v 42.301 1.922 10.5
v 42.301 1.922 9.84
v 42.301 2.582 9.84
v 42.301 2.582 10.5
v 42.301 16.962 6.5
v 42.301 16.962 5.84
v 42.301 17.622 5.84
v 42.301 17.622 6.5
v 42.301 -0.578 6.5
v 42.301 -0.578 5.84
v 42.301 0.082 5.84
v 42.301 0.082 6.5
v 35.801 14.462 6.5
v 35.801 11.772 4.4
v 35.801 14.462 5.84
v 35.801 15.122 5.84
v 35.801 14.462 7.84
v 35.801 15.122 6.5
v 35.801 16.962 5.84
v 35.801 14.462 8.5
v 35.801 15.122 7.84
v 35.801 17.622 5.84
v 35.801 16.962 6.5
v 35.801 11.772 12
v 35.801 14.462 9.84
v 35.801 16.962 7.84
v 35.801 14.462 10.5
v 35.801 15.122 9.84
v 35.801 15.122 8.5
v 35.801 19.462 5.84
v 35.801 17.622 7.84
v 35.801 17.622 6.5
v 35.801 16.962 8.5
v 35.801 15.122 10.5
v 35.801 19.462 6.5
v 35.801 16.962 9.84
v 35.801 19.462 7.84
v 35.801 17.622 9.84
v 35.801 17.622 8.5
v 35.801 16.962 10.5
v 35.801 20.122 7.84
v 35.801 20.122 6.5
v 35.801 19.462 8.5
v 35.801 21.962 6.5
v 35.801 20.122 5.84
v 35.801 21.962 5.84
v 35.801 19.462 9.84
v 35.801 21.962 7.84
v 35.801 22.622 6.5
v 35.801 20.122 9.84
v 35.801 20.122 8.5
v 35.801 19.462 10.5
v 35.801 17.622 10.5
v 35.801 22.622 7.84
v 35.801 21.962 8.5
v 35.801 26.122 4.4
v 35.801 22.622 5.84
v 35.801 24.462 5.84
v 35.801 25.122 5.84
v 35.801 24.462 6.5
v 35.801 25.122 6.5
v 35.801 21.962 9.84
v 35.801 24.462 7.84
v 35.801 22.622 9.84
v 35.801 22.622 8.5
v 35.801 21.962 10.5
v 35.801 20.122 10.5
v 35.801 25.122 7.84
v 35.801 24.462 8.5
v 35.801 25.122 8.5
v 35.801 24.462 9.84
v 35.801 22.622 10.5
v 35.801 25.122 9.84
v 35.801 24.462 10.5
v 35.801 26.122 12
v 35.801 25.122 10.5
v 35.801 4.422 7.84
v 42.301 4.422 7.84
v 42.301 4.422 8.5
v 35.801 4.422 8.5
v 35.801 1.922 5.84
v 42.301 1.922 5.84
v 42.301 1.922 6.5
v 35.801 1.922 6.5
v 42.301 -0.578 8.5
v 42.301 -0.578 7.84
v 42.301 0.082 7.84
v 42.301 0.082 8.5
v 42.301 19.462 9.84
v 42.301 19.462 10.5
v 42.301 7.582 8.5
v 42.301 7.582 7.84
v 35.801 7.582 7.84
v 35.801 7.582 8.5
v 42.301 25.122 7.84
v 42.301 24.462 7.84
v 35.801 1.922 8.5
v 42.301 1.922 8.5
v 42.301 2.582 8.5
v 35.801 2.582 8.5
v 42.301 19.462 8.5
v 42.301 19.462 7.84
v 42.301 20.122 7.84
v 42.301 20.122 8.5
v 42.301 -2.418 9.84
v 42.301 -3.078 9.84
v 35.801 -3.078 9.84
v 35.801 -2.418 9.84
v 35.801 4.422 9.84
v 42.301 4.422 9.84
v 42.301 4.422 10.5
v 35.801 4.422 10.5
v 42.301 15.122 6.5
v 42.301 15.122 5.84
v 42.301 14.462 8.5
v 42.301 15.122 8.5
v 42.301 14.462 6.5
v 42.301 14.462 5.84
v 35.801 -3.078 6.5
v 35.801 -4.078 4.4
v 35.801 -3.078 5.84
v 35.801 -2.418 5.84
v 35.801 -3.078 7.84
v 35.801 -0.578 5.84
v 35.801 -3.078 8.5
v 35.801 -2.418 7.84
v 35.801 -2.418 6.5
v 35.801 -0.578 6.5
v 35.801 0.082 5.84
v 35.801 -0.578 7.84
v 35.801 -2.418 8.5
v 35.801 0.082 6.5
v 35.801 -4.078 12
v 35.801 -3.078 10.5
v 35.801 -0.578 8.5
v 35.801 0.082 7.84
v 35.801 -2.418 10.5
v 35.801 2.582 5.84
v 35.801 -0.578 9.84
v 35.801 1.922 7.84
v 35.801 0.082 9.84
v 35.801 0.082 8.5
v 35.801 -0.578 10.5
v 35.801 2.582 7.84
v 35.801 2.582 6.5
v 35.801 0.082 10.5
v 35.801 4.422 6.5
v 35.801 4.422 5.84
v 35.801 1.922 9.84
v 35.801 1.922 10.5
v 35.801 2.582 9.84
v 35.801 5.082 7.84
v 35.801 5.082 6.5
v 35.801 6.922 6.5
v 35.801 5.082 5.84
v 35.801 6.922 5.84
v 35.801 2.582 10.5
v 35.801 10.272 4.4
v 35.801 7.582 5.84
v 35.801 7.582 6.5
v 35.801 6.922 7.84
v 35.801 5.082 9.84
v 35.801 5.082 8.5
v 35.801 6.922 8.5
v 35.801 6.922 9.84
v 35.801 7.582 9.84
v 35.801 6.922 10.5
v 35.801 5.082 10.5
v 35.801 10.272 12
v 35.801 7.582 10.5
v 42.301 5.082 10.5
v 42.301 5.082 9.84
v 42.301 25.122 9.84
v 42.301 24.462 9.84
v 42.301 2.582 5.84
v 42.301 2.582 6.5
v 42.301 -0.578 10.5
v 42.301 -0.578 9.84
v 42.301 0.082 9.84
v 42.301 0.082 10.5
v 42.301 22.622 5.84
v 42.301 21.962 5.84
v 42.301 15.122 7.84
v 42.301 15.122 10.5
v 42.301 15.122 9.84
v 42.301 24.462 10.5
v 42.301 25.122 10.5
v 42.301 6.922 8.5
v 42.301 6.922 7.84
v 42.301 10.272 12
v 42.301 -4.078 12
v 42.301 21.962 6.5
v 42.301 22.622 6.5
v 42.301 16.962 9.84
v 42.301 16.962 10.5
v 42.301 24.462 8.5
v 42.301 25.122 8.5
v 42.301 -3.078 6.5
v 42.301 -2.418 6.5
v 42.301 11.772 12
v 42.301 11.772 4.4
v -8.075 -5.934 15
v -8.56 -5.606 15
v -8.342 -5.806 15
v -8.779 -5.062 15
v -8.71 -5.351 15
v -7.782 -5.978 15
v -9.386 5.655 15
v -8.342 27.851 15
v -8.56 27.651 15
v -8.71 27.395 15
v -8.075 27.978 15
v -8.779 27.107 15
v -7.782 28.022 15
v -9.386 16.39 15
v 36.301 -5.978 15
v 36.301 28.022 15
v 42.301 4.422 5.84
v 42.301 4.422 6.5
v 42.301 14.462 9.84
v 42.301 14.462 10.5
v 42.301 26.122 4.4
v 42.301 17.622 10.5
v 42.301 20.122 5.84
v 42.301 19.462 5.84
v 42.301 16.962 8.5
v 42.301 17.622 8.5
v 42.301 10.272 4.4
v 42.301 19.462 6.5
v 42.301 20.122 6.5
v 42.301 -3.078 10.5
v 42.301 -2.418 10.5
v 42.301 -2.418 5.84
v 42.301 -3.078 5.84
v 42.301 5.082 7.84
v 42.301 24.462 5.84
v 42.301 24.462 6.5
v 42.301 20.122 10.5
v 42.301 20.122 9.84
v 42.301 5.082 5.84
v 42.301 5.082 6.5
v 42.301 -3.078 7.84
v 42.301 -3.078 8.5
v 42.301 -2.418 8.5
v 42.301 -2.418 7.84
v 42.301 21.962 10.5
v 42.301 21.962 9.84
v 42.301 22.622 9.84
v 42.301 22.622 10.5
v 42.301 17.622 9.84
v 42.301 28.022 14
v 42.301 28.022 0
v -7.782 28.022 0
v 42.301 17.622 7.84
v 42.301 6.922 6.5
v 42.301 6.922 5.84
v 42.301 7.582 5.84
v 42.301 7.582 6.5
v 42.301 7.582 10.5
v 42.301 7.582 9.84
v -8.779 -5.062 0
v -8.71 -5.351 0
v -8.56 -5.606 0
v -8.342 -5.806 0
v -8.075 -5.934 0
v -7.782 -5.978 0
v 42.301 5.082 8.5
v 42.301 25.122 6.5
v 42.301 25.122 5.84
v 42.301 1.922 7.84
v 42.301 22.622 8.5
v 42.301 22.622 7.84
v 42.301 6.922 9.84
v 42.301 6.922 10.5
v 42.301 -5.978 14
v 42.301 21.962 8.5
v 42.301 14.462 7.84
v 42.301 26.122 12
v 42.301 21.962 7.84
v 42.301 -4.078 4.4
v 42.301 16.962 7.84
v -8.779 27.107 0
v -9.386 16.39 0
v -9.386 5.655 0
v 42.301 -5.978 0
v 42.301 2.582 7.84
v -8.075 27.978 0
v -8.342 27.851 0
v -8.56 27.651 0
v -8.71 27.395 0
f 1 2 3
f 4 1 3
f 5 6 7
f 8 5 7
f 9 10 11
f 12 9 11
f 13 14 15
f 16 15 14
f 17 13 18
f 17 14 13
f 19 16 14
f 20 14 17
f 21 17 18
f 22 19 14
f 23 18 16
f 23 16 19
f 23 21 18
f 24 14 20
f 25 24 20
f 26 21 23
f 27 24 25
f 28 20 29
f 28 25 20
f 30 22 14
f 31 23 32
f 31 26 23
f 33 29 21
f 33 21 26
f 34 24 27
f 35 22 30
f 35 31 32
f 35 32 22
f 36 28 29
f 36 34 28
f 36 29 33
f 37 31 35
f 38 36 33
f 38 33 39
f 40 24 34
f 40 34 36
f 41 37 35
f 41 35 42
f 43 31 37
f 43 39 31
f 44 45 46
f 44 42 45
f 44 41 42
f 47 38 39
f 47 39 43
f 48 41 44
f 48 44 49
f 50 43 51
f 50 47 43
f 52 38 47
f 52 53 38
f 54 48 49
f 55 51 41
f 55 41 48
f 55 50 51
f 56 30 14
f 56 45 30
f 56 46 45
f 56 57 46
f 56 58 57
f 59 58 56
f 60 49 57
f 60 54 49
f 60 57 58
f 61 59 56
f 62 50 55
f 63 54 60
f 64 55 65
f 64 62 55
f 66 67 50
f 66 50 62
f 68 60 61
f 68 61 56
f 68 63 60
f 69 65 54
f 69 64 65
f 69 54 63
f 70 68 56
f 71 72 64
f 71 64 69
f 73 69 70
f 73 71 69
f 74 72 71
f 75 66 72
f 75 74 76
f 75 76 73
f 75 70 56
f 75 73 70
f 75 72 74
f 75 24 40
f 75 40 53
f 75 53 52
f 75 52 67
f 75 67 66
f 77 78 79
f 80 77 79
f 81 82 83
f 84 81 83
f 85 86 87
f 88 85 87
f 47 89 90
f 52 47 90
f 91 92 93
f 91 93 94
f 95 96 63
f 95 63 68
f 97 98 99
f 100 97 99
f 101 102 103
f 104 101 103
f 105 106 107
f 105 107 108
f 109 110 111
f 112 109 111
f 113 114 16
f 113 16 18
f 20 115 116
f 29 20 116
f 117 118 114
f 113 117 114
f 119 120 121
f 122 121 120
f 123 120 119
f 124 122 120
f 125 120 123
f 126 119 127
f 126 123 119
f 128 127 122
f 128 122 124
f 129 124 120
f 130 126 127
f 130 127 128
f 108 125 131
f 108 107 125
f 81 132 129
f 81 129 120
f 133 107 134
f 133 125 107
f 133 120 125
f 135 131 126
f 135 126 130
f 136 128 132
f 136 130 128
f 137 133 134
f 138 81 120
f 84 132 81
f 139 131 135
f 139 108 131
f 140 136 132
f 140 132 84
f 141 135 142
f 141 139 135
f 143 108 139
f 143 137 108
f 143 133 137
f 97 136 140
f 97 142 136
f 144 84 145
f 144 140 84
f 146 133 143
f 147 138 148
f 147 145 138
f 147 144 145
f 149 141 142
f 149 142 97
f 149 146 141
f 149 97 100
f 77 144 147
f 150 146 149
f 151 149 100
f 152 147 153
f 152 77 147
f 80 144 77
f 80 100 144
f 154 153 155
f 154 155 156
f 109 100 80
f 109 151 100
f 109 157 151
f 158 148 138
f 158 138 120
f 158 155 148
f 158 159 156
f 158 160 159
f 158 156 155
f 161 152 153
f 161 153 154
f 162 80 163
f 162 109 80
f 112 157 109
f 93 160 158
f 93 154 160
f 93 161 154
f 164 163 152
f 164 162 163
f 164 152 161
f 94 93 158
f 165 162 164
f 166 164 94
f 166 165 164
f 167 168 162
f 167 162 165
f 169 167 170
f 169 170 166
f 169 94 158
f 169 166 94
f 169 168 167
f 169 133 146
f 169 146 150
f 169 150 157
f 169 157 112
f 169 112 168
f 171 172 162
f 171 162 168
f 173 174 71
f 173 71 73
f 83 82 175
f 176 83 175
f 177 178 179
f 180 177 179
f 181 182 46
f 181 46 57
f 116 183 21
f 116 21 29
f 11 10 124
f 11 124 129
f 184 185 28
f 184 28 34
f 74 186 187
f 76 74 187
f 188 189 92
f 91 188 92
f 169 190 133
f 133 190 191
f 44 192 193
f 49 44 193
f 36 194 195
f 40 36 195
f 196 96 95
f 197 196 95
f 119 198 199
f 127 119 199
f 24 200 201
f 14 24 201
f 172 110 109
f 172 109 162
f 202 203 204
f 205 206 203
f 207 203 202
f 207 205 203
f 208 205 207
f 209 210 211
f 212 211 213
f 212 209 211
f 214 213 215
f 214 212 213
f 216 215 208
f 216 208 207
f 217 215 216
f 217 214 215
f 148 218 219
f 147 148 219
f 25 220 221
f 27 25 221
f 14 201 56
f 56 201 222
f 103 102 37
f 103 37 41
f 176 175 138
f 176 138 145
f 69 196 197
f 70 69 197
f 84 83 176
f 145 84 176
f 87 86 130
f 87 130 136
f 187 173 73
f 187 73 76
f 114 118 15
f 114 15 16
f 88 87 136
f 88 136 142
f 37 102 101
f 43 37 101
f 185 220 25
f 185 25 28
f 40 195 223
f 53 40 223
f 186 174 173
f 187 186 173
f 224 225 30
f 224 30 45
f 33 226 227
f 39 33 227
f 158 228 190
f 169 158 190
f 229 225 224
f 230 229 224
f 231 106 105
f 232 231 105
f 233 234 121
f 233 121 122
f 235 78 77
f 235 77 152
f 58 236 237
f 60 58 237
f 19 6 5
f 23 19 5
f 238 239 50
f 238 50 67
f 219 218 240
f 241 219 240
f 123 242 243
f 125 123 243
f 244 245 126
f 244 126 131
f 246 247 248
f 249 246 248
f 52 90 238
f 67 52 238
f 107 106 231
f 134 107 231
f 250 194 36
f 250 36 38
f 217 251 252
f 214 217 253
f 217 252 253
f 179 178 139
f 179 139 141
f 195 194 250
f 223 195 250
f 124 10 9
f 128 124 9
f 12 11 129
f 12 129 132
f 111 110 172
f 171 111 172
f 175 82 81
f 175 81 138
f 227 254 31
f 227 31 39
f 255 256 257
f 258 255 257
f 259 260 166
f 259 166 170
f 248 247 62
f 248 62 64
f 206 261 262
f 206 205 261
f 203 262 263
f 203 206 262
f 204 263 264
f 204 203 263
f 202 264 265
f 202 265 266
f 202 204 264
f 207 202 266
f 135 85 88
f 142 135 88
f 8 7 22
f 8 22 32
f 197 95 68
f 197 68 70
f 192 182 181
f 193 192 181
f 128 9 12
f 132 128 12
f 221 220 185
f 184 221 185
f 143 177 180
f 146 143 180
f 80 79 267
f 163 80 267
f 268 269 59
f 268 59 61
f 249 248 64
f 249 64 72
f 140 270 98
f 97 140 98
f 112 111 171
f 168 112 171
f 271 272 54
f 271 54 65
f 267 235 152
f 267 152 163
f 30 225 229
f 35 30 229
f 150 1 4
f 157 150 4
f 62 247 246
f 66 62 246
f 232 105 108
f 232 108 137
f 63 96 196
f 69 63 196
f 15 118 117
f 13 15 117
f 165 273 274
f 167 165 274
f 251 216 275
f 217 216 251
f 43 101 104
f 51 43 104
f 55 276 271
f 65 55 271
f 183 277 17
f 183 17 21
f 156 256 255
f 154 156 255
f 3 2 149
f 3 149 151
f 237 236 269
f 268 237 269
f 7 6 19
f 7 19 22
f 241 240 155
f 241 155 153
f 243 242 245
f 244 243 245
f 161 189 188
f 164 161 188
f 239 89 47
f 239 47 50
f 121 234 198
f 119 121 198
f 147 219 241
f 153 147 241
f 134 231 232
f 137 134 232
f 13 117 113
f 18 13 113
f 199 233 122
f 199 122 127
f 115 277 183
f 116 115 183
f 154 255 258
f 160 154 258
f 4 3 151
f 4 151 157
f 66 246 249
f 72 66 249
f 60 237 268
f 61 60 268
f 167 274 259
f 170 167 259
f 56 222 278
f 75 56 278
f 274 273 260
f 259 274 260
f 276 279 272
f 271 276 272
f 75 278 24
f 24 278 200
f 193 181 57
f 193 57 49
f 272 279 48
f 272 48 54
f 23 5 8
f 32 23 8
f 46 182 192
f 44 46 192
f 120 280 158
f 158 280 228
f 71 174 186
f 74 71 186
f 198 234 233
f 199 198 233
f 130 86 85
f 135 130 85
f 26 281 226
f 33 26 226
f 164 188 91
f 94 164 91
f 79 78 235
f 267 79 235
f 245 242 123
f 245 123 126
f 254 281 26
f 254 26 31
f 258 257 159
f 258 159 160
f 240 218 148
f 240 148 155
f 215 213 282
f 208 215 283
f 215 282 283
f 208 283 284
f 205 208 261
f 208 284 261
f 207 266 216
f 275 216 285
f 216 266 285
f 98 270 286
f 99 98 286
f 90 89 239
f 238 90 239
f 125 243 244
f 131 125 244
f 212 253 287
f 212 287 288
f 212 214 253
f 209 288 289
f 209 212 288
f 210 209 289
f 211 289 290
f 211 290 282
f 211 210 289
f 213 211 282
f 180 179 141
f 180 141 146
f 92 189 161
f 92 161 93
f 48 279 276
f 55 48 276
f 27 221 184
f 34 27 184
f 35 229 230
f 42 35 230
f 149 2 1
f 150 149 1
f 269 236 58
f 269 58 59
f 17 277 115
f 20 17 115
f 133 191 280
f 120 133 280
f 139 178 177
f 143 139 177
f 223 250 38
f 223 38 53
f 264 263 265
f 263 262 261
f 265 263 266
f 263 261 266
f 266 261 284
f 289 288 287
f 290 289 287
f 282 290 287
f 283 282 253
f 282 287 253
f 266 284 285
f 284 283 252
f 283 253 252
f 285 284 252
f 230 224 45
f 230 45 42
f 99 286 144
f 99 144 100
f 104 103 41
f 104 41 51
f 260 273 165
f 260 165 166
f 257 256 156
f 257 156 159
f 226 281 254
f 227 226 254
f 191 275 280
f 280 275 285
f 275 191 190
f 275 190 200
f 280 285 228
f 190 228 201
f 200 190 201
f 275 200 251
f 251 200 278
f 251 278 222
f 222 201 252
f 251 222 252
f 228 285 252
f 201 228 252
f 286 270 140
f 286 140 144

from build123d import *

# Parameters (mm, degrees)
F1_DEPTH = 15
F2_SIZE2 = 6
F2_SIZE  = 1
F3_W     = 0.66
F3_H     = 0.66
F4_DEPTH = 6.5
F5_R     = 1


with BuildPart() as f1:
    # F0 (on Top) → F1 (new body)
    with BuildSketch(Plane.XY):
        with BuildLine():
            Line((42.301387, 28.022311), (-8.698613, 28.022311))
            ThreePointArc((-8.698613, 28.022311), (-9.46174, 11.022311), (-8.698613, -5.977689))
            Line((-8.698613, -5.977689), (42.301387, -5.977689))
            Line((42.301387, -5.977689), (42.301387, 28.022311))
        make_face()
    extrude(amount=F1_DEPTH)

    # F2
    f2_edges = [f1.edges().sort_by_distance(p)[0] for p in [
        (42.301387, 11.022311, 15),
    ]]
    chamfer(f2_edges, length=F2_SIZE, length2=F2_SIZE2)

    # F3 (on face) → F4 (cut)
    with BuildSketch(Plane.YZ.offset(42.301387)):
        Polygon((9.922311, 12), (-4.077689, 12), (-4.077689, 4.4), (9.922311, 4.4), (10.272311, 4.4), (10.272311, 12), align=None)
        with Locations((-2.747689, 6.17)):
            Rectangle(F3_W, F3_H, mode=Mode.SUBTRACT)
        with Locations((-0.247689, 6.17)):
            Rectangle(F3_W, F3_H, mode=Mode.SUBTRACT)
        with Locations((2.252311, 6.17)):
            Rectangle(F3_W, F3_H, mode=Mode.SUBTRACT)
        with Locations((4.752311, 6.17)):
            Rectangle(F3_W, F3_H, mode=Mode.SUBTRACT)
        with Locations((7.252311, 6.17)):
            Rectangle(F3_W, F3_H, mode=Mode.SUBTRACT)
        with Locations((-2.747689, 8.17)):
            Rectangle(F3_W, F3_H, mode=Mode.SUBTRACT)
        with Locations((-0.247689, 8.17)):
            Rectangle(F3_W, F3_H, mode=Mode.SUBTRACT)
        with Locations((2.252311, 8.17)):
            Rectangle(F3_W, F3_H, mode=Mode.SUBTRACT)
        with Locations((4.752311, 8.17)):
            Rectangle(F3_W, F3_H, mode=Mode.SUBTRACT)
        with Locations((7.252311, 8.17)):
            Rectangle(F3_W, F3_H, mode=Mode.SUBTRACT)
        with Locations((-2.747689, 10.17)):
            Rectangle(F3_W, F3_H, mode=Mode.SUBTRACT)
        with Locations((-0.247689, 10.17)):
            Rectangle(F3_W, F3_H, mode=Mode.SUBTRACT)
        with Locations((2.252311, 10.17)):
            Rectangle(F3_W, F3_H, mode=Mode.SUBTRACT)
        with Locations((4.752311, 10.17)):
            Rectangle(F3_W, F3_H, mode=Mode.SUBTRACT)
        with Locations((7.252311, 10.17)):
            Rectangle(F3_W, F3_H, mode=Mode.SUBTRACT)
        Polygon((12.122311, 12), (11.772311, 12), (11.772311, 4.4), (12.122311, 4.4), (26.122311, 4.4), (26.122311, 12), align=None)
        with Locations((14.792311, 6.17)):
            Rectangle(F3_W, F3_H, mode=Mode.SUBTRACT)
        with Locations((17.292311, 6.17)):
            Rectangle(F3_W, F3_H, mode=Mode.SUBTRACT)
        with Locations((19.792311, 6.17)):
            Rectangle(F3_W, F3_H, mode=Mode.SUBTRACT)
        with Locations((22.292311, 6.17)):
            Rectangle(F3_W, F3_H, mode=Mode.SUBTRACT)
        with Locations((24.792311, 6.17)):
            Rectangle(F3_W, F3_H, mode=Mode.SUBTRACT)
        with Locations((14.792311, 8.17)):
            Rectangle(F3_W, F3_H, mode=Mode.SUBTRACT)
        with Locations((17.292311, 8.17)):
            Rectangle(F3_W, F3_H, mode=Mode.SUBTRACT)
        with Locations((19.792311, 8.17)):
            Rectangle(F3_W, F3_H, mode=Mode.SUBTRACT)
        with Locations((22.292311, 8.17)):
            Rectangle(F3_W, F3_H, mode=Mode.SUBTRACT)
        with Locations((24.792311, 8.17)):
            Rectangle(F3_W, F3_H, mode=Mode.SUBTRACT)
        with Locations((14.792311, 10.17)):
            Rectangle(F3_W, F3_H, mode=Mode.SUBTRACT)
        with Locations((17.292311, 10.17)):
            Rectangle(F3_W, F3_H, mode=Mode.SUBTRACT)
        with Locations((19.792311, 10.17)):
            Rectangle(F3_W, F3_H, mode=Mode.SUBTRACT)
        with Locations((22.292311, 10.17)):
            Rectangle(F3_W, F3_H, mode=Mode.SUBTRACT)
        with Locations((24.792311, 10.17)):
            Rectangle(F3_W, F3_H, mode=Mode.SUBTRACT)
    extrude(amount=-F4_DEPTH, mode=Mode.SUBTRACT)

    # F5
    f5_edges = [f1.edges().sort_by_distance(p)[0] for p in [
        (-8.698613, -5.977689, 7.5),
        (-8.698613, 28.022311, 7.5),
    ]]
    fillet(f5_edges, radius=F5_R)


solid = f1.part
